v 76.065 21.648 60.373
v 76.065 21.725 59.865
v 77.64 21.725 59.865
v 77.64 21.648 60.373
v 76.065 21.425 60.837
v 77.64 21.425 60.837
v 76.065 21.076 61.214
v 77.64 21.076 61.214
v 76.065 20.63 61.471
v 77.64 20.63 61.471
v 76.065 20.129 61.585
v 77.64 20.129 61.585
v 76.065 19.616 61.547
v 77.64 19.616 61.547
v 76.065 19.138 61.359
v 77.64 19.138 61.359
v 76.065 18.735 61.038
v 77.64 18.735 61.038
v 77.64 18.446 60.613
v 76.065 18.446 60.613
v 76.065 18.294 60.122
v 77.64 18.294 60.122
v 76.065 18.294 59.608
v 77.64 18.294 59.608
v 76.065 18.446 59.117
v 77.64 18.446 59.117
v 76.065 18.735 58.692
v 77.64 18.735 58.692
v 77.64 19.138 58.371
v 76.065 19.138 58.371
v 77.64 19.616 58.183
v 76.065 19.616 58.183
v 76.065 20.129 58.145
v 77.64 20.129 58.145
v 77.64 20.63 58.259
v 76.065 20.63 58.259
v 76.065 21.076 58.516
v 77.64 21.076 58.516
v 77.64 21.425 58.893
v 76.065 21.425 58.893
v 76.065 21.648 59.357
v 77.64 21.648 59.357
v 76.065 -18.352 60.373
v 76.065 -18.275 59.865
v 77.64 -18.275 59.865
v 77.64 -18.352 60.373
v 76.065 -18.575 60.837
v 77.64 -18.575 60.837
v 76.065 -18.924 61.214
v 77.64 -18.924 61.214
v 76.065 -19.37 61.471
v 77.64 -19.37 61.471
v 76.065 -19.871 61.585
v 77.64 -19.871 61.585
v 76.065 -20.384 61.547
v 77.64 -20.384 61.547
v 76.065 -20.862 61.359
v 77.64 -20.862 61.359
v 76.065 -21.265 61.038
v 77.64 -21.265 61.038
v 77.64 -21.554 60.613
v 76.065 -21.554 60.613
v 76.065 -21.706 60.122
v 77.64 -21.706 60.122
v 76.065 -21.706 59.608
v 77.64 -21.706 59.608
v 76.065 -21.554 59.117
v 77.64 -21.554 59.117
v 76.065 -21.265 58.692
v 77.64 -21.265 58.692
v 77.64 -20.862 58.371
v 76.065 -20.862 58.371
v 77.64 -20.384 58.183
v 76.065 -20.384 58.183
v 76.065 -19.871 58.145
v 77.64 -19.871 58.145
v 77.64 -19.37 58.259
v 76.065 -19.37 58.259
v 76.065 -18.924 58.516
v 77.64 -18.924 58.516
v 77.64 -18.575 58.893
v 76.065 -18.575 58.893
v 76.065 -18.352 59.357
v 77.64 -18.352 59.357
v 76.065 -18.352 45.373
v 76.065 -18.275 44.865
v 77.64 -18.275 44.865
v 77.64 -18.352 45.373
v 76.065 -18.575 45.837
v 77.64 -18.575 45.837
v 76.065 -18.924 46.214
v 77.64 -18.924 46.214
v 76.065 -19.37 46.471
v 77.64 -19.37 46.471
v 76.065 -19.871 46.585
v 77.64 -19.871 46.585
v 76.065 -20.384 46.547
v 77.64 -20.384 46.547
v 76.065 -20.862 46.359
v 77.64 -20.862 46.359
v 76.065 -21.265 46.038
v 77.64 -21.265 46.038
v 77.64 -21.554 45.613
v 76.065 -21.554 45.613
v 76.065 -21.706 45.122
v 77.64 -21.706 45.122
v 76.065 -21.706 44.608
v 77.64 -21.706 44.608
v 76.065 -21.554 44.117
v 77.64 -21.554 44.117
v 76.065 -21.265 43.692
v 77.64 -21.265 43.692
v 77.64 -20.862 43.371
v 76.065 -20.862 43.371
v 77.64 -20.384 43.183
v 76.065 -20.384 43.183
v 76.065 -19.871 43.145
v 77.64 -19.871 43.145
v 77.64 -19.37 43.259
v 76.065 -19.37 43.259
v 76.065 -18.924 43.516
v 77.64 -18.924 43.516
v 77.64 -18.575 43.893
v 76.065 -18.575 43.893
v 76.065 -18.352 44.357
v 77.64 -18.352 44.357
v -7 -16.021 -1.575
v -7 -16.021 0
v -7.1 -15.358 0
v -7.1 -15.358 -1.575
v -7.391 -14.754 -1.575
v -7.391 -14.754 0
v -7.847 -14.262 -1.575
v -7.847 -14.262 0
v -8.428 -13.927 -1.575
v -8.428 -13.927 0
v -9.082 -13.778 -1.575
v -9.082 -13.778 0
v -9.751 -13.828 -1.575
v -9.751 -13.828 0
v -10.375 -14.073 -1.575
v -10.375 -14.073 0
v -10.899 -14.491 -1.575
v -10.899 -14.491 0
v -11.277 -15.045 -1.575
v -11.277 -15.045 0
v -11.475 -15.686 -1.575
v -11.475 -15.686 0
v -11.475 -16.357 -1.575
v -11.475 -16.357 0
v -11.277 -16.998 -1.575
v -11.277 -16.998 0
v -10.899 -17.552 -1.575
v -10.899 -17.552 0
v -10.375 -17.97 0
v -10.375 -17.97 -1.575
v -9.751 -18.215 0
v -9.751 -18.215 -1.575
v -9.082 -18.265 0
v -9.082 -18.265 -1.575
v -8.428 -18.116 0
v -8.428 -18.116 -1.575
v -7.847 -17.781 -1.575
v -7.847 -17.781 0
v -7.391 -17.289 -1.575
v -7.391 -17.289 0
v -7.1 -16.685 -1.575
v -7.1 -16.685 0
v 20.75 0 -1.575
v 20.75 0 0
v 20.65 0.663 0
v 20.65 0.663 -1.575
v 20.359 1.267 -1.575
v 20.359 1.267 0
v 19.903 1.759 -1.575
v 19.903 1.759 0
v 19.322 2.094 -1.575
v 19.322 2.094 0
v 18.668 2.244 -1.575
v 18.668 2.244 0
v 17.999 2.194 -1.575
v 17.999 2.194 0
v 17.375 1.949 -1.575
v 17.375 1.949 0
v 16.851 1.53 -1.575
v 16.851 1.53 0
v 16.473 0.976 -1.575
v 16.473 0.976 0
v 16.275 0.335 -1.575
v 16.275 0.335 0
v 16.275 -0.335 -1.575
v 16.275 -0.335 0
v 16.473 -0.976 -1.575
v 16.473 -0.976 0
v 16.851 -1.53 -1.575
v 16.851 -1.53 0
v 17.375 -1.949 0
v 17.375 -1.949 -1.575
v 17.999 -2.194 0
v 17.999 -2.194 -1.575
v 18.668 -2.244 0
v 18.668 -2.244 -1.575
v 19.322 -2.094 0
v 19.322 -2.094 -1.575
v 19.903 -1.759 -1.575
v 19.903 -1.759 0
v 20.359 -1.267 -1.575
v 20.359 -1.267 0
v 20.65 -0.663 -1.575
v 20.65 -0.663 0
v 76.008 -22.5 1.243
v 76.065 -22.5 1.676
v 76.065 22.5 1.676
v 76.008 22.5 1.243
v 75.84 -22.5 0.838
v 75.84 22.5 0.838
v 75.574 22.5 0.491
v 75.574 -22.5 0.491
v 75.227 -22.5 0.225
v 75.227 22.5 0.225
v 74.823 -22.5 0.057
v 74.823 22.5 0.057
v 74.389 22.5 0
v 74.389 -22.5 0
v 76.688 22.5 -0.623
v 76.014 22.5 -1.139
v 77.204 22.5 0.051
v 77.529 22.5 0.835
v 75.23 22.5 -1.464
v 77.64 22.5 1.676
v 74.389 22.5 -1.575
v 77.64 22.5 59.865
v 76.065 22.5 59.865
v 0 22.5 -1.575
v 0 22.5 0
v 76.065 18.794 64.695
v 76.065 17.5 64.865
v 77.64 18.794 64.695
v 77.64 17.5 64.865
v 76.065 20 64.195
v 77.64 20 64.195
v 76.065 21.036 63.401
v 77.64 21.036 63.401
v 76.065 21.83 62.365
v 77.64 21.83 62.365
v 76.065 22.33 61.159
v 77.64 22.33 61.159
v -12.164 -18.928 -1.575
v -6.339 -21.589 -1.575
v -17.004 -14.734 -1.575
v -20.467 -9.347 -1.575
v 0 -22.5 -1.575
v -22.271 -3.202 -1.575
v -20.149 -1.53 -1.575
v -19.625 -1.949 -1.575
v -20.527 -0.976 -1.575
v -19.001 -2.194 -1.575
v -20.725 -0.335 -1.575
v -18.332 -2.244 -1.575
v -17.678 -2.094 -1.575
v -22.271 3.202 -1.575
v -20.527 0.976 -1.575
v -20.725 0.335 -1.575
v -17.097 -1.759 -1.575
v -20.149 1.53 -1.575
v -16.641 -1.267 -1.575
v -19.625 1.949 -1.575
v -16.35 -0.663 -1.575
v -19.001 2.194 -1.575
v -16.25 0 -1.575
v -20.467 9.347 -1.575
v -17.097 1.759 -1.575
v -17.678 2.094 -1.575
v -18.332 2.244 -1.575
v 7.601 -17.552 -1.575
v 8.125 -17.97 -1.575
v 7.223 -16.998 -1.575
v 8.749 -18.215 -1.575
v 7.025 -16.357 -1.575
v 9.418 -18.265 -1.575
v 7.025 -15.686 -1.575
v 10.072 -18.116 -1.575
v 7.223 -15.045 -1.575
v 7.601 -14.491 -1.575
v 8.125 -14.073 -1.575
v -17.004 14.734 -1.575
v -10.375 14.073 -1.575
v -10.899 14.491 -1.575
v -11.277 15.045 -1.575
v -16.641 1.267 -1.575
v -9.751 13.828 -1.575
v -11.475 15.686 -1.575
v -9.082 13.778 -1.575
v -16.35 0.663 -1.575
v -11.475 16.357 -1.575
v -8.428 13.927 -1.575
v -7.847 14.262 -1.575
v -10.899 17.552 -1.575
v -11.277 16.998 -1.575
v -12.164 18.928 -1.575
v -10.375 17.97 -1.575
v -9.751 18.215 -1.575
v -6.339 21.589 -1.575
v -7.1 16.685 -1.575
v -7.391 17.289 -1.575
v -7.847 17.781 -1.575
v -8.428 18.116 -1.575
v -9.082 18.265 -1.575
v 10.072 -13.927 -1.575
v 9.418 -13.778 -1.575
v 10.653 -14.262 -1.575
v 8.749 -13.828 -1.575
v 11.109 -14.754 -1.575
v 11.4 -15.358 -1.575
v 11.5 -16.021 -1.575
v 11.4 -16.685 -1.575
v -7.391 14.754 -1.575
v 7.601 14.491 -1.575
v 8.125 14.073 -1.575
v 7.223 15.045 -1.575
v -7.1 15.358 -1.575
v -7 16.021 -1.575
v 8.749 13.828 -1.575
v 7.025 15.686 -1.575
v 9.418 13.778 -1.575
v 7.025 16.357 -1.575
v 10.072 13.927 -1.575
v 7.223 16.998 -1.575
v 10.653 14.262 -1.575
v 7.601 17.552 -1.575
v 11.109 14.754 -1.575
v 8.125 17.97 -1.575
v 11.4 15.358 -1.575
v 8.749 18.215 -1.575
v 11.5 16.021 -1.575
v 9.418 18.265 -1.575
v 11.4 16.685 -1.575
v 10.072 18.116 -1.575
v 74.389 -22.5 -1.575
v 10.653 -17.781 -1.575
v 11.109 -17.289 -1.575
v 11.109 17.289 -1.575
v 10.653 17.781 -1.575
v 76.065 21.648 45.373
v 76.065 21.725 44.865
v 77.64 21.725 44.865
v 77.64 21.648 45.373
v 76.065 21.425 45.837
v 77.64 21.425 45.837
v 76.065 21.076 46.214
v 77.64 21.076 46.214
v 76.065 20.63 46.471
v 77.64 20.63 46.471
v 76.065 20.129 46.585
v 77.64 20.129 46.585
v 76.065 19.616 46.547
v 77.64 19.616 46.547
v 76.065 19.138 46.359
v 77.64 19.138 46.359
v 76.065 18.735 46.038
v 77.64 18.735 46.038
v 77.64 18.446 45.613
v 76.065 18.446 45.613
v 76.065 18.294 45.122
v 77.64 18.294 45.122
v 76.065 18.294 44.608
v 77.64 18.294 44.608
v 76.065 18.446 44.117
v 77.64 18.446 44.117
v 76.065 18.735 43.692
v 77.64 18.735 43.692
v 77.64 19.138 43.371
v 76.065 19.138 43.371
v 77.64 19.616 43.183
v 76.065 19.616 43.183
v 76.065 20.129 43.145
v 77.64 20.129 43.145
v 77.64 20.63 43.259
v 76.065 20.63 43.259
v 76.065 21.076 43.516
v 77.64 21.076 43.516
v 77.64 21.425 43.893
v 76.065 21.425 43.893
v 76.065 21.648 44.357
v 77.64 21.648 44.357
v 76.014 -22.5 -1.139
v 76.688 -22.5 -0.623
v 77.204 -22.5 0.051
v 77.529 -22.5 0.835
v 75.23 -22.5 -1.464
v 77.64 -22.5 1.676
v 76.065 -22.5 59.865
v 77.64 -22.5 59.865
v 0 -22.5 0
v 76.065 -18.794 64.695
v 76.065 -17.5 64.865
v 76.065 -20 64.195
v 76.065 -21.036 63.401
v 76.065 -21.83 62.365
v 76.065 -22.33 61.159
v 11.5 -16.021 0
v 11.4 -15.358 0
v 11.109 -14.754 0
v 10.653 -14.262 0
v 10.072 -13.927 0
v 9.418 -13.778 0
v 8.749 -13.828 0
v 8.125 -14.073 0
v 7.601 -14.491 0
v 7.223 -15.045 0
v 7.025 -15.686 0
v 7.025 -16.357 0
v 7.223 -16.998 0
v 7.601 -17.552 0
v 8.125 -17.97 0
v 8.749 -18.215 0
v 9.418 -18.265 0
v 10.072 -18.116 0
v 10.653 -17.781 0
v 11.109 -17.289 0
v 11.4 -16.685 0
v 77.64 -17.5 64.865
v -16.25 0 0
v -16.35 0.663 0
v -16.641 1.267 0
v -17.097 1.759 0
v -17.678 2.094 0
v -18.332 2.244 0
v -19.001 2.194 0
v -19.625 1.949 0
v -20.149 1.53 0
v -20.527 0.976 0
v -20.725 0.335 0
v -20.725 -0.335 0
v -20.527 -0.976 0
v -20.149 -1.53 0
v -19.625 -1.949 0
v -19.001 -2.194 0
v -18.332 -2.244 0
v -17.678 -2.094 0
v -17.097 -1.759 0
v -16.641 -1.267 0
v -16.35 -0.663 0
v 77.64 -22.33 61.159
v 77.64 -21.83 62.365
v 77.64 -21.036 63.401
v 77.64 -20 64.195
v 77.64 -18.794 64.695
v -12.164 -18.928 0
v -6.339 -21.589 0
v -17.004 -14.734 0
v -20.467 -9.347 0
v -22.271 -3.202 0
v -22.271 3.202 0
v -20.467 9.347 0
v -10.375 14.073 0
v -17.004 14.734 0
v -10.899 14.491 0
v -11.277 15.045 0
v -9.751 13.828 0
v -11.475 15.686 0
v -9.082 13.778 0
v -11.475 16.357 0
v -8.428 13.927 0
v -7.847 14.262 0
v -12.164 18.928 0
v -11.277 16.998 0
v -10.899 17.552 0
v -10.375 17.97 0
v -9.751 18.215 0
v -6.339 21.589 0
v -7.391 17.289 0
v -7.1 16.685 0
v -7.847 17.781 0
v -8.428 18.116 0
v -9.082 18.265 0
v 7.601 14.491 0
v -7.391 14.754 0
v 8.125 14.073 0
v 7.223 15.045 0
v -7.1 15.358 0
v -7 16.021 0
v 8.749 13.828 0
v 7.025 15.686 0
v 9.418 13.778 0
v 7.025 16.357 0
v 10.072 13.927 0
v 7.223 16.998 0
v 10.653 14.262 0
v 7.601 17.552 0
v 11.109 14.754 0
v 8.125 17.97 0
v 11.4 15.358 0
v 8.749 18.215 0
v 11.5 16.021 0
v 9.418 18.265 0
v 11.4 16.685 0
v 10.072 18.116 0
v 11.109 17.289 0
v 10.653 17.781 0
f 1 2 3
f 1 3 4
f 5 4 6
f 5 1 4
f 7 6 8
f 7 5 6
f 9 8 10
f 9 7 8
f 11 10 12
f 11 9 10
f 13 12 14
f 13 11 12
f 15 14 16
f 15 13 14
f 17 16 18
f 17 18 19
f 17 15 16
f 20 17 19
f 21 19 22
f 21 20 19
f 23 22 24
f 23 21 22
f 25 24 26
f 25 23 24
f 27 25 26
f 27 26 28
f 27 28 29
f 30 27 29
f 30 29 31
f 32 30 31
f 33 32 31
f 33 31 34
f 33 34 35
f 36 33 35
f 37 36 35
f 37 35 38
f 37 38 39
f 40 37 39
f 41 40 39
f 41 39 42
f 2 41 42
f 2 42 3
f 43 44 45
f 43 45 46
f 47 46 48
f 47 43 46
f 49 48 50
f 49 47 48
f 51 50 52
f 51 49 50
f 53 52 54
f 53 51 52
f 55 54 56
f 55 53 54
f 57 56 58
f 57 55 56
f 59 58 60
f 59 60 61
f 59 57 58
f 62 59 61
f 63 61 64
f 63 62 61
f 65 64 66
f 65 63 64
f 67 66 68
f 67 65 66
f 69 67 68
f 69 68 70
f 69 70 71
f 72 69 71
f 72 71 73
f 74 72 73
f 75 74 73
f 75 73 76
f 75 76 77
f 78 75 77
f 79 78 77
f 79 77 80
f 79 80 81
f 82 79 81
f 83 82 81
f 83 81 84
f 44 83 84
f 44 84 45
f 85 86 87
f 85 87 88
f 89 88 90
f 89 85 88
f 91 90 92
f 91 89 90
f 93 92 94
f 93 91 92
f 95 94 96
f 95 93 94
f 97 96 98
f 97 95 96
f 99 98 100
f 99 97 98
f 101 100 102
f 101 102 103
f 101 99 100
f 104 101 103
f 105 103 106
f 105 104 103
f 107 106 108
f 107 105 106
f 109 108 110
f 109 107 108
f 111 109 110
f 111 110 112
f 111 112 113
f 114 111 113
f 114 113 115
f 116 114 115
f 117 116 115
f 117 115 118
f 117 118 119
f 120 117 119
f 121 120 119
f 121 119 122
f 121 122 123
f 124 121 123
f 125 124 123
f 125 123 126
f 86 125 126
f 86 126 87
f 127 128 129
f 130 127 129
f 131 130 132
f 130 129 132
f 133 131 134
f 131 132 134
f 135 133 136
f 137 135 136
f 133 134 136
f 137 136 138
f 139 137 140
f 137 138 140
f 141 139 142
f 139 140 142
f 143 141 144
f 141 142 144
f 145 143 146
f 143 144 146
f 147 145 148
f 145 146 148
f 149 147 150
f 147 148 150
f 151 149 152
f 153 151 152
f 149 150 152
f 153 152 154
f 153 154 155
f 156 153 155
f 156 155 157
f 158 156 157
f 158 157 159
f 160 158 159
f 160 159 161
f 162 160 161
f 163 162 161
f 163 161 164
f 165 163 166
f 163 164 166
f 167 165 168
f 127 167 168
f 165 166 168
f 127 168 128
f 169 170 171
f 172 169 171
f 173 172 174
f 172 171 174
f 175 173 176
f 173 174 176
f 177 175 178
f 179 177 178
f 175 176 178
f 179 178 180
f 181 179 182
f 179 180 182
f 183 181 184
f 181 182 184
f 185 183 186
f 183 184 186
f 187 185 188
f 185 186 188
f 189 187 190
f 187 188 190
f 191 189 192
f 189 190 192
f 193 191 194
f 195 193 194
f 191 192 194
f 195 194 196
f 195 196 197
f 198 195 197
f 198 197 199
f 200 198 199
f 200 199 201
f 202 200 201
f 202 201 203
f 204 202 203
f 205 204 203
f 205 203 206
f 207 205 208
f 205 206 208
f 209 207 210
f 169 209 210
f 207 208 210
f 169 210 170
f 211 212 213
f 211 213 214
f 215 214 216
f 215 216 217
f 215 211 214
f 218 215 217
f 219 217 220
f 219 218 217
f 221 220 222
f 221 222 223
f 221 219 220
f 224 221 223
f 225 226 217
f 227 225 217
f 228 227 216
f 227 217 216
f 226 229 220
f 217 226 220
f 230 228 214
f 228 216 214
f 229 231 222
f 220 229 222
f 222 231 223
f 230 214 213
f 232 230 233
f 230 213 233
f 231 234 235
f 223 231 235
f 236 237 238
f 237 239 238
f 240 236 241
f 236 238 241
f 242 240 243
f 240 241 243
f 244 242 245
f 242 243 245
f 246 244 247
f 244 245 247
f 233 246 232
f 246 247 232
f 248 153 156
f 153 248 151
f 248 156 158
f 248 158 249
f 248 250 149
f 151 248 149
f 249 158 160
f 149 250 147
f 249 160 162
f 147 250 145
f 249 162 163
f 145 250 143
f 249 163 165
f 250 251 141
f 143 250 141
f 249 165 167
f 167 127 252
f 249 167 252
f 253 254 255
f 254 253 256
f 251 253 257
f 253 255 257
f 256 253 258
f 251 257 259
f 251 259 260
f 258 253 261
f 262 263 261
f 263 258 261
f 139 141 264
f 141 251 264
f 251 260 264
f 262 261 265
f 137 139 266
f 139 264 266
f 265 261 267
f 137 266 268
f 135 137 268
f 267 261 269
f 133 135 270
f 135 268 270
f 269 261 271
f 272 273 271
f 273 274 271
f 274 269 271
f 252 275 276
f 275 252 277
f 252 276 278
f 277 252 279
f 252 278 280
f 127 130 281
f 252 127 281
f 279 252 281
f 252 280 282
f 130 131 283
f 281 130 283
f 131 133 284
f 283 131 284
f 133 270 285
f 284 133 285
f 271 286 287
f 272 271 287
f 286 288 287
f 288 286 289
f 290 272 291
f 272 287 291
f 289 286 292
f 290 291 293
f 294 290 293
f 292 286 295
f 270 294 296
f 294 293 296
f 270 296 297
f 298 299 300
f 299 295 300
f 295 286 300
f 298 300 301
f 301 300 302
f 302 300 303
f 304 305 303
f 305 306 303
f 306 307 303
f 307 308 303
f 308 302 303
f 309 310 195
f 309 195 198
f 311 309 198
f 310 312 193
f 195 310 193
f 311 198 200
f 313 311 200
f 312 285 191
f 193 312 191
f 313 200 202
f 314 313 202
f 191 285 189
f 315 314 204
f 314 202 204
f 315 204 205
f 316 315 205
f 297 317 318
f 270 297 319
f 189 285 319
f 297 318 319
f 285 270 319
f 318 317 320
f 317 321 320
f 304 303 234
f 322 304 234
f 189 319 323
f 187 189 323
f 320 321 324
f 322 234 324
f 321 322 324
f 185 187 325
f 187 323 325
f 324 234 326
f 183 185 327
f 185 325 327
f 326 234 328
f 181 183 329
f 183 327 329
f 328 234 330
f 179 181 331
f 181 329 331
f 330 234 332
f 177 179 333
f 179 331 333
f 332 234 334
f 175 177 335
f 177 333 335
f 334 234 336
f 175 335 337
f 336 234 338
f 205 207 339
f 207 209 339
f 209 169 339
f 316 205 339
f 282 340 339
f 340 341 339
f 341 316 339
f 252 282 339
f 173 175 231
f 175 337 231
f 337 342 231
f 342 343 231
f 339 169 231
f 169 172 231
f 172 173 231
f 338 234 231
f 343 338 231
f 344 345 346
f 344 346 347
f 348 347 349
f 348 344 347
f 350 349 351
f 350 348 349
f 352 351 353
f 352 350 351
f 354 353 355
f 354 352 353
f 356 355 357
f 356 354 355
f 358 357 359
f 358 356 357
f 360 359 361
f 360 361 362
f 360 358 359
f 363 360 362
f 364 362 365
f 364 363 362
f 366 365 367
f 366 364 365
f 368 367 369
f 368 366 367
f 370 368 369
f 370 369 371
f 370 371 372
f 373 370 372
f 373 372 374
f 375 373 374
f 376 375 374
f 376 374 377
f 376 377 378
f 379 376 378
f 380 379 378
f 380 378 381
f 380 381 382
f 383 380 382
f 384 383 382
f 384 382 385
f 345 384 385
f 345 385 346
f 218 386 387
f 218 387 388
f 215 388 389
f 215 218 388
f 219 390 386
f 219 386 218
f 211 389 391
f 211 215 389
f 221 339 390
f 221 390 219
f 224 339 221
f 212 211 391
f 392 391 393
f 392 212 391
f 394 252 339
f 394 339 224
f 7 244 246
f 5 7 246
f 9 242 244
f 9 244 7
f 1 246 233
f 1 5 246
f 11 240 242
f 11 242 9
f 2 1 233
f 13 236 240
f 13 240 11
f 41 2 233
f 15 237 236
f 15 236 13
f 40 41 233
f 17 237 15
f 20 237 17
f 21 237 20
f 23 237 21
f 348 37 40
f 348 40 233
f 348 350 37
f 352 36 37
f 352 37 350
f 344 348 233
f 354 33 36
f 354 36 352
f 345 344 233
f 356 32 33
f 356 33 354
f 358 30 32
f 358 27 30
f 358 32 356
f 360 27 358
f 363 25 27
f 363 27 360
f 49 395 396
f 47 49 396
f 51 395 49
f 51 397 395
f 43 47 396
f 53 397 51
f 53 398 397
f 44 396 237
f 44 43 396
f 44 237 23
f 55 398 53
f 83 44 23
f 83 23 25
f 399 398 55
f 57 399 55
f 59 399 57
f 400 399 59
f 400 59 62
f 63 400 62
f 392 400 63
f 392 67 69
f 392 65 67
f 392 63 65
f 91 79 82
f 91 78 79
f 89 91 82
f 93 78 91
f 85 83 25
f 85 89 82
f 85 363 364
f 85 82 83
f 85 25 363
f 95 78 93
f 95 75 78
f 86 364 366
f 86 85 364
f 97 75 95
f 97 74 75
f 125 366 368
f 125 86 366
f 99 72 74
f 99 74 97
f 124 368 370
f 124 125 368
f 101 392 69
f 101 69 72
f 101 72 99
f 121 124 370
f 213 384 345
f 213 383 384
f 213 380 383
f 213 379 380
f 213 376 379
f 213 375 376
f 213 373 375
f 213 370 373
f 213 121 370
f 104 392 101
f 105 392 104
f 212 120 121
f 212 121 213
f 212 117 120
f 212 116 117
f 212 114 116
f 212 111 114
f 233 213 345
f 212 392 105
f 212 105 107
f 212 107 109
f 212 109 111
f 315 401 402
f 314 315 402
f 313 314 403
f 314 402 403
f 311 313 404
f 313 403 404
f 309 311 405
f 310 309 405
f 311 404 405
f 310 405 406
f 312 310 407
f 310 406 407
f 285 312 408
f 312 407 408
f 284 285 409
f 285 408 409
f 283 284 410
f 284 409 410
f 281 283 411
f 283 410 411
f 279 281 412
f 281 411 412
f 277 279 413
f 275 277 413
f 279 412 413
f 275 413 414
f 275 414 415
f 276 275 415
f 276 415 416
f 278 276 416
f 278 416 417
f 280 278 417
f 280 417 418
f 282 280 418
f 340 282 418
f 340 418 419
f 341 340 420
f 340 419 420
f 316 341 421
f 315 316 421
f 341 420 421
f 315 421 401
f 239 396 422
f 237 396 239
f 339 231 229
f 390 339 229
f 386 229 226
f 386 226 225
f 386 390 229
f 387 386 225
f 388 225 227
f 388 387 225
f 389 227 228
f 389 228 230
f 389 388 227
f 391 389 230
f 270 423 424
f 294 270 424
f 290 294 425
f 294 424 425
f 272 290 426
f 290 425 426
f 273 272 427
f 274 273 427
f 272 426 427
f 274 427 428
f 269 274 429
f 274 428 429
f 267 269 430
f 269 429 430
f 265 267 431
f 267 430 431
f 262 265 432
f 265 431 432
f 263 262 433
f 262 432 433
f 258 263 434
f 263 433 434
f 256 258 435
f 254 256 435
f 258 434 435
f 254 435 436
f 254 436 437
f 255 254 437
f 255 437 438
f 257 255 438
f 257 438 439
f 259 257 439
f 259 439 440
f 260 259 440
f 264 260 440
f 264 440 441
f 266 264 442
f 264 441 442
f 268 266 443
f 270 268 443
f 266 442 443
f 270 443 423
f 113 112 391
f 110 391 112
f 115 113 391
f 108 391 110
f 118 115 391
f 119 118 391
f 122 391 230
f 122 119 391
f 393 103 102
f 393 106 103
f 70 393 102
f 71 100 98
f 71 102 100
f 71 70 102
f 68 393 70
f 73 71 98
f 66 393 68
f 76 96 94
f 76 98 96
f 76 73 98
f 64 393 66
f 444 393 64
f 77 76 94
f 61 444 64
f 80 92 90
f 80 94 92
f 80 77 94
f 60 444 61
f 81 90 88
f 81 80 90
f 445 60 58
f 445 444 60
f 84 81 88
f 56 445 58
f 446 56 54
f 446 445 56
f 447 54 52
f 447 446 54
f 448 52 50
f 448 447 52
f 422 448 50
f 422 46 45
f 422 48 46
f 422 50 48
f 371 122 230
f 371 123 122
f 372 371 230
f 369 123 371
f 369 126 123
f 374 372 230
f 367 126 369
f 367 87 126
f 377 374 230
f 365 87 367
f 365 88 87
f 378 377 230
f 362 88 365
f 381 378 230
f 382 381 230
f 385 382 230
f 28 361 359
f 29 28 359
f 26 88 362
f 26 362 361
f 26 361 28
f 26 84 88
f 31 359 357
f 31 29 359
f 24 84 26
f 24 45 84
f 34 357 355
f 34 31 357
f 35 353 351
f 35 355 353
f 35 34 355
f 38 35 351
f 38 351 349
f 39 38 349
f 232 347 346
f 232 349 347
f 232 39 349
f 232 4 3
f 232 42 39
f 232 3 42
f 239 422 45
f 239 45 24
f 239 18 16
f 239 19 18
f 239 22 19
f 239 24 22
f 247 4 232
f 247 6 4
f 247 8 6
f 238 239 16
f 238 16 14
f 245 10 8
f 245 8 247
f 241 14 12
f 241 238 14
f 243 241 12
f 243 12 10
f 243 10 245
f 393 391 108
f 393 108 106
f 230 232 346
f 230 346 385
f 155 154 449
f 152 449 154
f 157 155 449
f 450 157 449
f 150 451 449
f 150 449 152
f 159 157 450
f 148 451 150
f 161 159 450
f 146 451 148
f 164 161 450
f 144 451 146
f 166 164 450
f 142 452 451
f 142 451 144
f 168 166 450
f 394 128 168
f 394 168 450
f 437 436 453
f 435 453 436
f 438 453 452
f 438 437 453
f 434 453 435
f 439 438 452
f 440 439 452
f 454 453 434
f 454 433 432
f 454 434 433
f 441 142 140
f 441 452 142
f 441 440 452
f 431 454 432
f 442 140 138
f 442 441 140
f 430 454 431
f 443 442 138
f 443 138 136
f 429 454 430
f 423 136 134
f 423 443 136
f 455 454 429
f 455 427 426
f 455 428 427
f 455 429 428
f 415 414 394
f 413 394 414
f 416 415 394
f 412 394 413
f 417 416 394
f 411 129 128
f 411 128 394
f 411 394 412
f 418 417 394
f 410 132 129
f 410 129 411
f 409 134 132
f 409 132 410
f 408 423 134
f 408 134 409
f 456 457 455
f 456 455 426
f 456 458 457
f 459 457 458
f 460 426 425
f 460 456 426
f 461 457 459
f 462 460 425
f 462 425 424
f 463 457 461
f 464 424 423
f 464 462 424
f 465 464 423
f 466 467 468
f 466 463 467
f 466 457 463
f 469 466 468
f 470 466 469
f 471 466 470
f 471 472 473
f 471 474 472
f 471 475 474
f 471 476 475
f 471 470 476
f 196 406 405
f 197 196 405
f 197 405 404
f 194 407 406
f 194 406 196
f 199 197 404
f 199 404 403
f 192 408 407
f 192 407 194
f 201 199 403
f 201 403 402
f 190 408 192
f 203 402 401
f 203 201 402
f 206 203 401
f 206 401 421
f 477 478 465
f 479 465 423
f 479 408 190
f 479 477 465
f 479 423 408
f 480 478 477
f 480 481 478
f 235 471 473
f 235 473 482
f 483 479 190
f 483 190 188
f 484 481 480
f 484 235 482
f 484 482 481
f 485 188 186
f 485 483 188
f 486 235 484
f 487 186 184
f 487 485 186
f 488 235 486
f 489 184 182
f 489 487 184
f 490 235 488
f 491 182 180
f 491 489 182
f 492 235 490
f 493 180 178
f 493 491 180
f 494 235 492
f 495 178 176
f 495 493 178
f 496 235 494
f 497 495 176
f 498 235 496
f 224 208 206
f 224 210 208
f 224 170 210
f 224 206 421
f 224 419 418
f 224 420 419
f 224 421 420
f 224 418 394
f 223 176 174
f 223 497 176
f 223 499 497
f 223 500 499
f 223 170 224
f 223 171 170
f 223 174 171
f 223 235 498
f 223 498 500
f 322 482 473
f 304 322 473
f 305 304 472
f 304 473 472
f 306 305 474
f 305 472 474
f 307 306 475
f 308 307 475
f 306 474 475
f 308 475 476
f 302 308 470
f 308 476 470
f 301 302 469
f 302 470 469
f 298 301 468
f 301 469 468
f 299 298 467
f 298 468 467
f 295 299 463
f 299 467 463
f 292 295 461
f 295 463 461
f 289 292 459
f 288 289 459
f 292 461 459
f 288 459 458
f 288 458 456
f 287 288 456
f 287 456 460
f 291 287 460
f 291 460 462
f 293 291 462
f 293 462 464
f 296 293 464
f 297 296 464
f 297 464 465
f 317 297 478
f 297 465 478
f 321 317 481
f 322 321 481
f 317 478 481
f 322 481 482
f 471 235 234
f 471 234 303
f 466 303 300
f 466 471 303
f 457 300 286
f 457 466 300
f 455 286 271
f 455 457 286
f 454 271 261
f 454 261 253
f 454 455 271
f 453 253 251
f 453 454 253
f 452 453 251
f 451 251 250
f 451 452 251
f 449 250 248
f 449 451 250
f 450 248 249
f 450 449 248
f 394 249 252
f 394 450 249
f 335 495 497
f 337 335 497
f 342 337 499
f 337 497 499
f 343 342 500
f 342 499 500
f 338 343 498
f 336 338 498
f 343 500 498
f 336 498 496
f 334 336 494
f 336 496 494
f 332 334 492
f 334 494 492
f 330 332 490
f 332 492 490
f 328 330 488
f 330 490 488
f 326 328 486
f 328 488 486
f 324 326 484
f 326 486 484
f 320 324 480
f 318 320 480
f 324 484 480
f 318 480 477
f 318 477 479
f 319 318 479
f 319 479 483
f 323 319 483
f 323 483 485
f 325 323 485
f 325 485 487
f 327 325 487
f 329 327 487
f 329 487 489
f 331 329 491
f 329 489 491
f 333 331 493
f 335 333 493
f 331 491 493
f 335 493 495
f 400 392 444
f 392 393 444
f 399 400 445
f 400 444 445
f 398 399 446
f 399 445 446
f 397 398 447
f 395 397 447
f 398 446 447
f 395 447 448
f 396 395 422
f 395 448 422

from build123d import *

# Parameters (mm, degrees)
SKETCH1_R                  = 2.25
SKETCH1_R_2                = 1.725
BASE_FLANGE1_DEPTH         = 1.5748
SKETCHED_START             = 77.296428764
SKETCHED_BEND1_OUTLINE_W   = 45
SKETCHED_BEND1_OUTLINE_H   = 1.5748
SKETCHED_BEND1_DEPTH       = 63.903571236
SKETCHED_START_2           = 74.388620508
SKETCHED_BEND1_2_OUTLINE_W = 45
SKETCHED_BEND1_2_OUTLINE_H = 64.865020508
SKETCHED_BEND1_2_OUTLINE_R = 1.725
SKETCHED_BEND1_2_DEPTH     = 3.2512
SKETCHED_START_3           = -22.5
SKETCHED_BEND1_3_DEPTH     = 45
FILLET1_R                  = 5


with BuildPart() as part:
    # Base-Flange1: sheet metal written as solids
    # Sketch1 → Base-Flange1 (new body)
    with BuildSketch(Plane.XY):
        with BuildLine():
            Line((0, -22.5), (141.2, -22.5))
            Line((141.2, -22.5), (141.2, 22.5))
            Line((141.2, 22.5), (0, 22.5))
            ThreePointArc((0, 22.5), (-22.5, 0), (0, -22.5))
        make_face()
        with Locations((9.25, 16.02146997)):
            Circle(SKETCH1_R, mode=Mode.SUBTRACT)
        with Locations((18.5, 0)):
            Circle(SKETCH1_R, mode=Mode.SUBTRACT)
        with Locations((9.25, -16.02146997)):
            Circle(SKETCH1_R, mode=Mode.SUBTRACT)
        with Locations((-9.25, -16.02146997)):
            Circle(SKETCH1_R, mode=Mode.SUBTRACT)
        with Locations((-18.5, 0)):
            Circle(SKETCH1_R, mode=Mode.SUBTRACT)
        with Locations((-9.25, 16.02146997)):
            Circle(SKETCH1_R, mode=Mode.SUBTRACT)
        with Locations((121.2, 20)):
            Circle(SKETCH1_R_2, mode=Mode.SUBTRACT)
        with Locations((136.2, 20)):
            Circle(SKETCH1_R_2, mode=Mode.SUBTRACT)
        with Locations((136.2, -20)):
            Circle(SKETCH1_R_2, mode=Mode.SUBTRACT)
        with Locations((121.2, -20)):
            Circle(SKETCH1_R_2, mode=Mode.SUBTRACT)
    extrude(amount=-BASE_FLANGE1_DEPTH)

    # Sketched Bend1: read off the stored shape, not the designer's step
    # Sketched Bend1 outline → Sketched Bend1 (cut)
    with BuildSketch(Plane.YZ.offset(SKETCHED_START)):
        with Locations((0, -0.7874)):
            Rectangle(SKETCHED_BEND1_OUTLINE_W, SKETCHED_BEND1_OUTLINE_H)
    extrude(amount=SKETCHED_BEND1_DEPTH, mode=Mode.SUBTRACT)

    # Sketched Bend1 2 outline → Sketched Bend1 2 (add)
    with BuildSketch(Plane.YZ.offset(SKETCHED_START_2)):
        with Locations((0, 32.432510254)):
            Rectangle(SKETCHED_BEND1_2_OUTLINE_W, SKETCHED_BEND1_2_OUTLINE_H)
        with Locations((-20, 44.865020508)):
            Circle(SKETCHED_BEND1_2_OUTLINE_R, mode=Mode.SUBTRACT)
        with Locations((-20, 59.865020508)):
            Circle(SKETCHED_BEND1_2_OUTLINE_R, mode=Mode.SUBTRACT)
        with Locations((20, 44.865020508)):
            Circle(SKETCHED_BEND1_2_OUTLINE_R, mode=Mode.SUBTRACT)
        with Locations((20, 59.865020508)):
            Circle(SKETCHED_BEND1_2_OUTLINE_R, mode=Mode.SUBTRACT)
    extrude(amount=SKETCHED_BEND1_2_DEPTH)

    # Sketched Bend1 3 outline → Sketched Bend1 3 (cut)
    with BuildSketch(Plane(origin=(0, 0, 0), x_dir=(1, 0, 0), z_dir=(0, 1, 0)).offset(SKETCHED_START_3)):
        with BuildLine():
            ThreePointArc((74.388620508, 1.5748), (76.687566075, 0.622545567), (77.639820508, -1.6764))
            Line((77.639820508, -1.6764), (77.639820508, 0))
            Line((77.639820508, 0), (77.296428764, 0))
            Line((77.296428764, 0), (77.296428764, 1.5748))
            Line((77.296428764, 1.5748), (74.388620508, 1.5748))
        make_face()
        with BuildLine():
            Line((76.065020508, -64.865020508), (76.065020508, -1.6764))
            ThreePointArc((76.065020508, -1.6764), (75.574014316, -0.491006192), (74.388620508, 0))
            Line((74.388620508, 0), (74.388620508, -64.865020508))
            Line((74.388620508, -64.865020508), (76.065020508, -64.865020508))
        make_face()
    extrude(amount=SKETCHED_BEND1_3_DEPTH, mode=Mode.SUBTRACT)

    # Fillet1
    fillet1_edges = [part.edges().sort_by_distance(p)[0] for p in [
        (76.852420508, 22.5, 64.865020508),
        (76.852420508, -22.5, 64.865020508),
    ]]
    fillet(fillet1_edges, radius=FILLET1_R)


solid = part.part
